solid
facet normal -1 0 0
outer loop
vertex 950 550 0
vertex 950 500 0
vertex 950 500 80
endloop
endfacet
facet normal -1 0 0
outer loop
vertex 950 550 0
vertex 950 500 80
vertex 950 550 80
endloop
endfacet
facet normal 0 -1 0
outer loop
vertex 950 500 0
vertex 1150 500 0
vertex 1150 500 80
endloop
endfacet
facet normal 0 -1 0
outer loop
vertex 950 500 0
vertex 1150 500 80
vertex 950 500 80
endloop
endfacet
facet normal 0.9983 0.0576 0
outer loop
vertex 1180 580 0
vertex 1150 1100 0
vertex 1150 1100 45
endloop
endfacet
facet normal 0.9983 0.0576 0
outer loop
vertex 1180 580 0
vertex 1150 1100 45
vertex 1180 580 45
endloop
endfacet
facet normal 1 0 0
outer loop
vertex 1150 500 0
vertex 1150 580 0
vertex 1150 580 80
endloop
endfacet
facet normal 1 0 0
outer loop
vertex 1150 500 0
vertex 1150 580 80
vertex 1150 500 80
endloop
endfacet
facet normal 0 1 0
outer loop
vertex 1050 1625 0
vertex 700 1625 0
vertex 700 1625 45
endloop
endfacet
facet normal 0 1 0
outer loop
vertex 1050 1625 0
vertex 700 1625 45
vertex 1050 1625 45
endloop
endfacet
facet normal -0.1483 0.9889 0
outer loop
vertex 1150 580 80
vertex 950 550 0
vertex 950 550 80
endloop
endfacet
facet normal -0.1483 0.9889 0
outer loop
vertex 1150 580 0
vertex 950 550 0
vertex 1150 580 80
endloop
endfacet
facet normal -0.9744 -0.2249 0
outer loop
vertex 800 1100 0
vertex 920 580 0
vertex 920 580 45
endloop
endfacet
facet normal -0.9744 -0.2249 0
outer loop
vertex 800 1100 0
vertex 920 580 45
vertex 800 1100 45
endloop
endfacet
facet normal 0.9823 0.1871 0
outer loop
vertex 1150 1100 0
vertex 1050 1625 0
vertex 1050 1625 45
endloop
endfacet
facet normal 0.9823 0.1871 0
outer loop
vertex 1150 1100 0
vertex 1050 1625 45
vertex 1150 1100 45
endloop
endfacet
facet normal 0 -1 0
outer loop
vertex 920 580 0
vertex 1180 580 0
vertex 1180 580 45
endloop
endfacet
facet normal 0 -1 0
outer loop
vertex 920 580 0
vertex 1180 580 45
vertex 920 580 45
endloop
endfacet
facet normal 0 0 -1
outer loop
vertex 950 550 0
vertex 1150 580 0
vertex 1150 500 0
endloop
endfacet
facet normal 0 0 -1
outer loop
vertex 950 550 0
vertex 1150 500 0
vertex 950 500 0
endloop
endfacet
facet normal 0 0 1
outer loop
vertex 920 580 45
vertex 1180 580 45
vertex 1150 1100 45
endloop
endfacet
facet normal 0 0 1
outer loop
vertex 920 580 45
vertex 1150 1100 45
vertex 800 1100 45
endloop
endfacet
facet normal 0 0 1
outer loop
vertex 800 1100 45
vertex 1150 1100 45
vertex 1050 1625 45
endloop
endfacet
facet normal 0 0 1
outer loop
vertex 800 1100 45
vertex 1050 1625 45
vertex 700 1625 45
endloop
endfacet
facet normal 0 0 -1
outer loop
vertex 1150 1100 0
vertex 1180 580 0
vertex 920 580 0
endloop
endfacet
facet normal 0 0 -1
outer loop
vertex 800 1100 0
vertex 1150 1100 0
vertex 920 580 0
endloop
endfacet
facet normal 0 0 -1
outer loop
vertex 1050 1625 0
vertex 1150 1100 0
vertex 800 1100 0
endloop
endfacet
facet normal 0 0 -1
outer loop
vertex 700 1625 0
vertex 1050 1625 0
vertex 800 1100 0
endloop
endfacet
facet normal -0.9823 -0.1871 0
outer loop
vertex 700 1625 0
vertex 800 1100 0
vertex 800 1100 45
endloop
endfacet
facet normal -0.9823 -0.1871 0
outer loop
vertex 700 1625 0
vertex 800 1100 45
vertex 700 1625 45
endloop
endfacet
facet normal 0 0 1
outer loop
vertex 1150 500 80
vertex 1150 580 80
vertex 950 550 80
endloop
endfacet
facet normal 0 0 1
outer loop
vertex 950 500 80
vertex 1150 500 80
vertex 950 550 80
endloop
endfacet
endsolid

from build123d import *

# Parameters (mm, degrees)
BOSS_EXTRUDE1_DEPTH = 80
BOSS_EXTRUDE2_DEPTH = 45


with BuildPart() as part:
    # Sketch1 → Boss-Extrude1 (new body)
    with BuildSketch(Plane.XY):
        Polygon((950, 500), (950, 550), (1150, 580), (1150, 500), align=None)
    extrude(amount=BOSS_EXTRUDE1_DEPTH)


with BuildPart() as body_2:
    # Sketch2 → Boss-Extrude2 (new body)
    with BuildSketch(Plane.XY):
        Polygon((920, 580), (800, 1100), (700, 1625), (1050, 1625), (1150, 1100), (1180, 580), align=None)
    extrude(amount=BOSS_EXTRUDE2_DEPTH)


solid = Compound([part.part, body_2.part])
